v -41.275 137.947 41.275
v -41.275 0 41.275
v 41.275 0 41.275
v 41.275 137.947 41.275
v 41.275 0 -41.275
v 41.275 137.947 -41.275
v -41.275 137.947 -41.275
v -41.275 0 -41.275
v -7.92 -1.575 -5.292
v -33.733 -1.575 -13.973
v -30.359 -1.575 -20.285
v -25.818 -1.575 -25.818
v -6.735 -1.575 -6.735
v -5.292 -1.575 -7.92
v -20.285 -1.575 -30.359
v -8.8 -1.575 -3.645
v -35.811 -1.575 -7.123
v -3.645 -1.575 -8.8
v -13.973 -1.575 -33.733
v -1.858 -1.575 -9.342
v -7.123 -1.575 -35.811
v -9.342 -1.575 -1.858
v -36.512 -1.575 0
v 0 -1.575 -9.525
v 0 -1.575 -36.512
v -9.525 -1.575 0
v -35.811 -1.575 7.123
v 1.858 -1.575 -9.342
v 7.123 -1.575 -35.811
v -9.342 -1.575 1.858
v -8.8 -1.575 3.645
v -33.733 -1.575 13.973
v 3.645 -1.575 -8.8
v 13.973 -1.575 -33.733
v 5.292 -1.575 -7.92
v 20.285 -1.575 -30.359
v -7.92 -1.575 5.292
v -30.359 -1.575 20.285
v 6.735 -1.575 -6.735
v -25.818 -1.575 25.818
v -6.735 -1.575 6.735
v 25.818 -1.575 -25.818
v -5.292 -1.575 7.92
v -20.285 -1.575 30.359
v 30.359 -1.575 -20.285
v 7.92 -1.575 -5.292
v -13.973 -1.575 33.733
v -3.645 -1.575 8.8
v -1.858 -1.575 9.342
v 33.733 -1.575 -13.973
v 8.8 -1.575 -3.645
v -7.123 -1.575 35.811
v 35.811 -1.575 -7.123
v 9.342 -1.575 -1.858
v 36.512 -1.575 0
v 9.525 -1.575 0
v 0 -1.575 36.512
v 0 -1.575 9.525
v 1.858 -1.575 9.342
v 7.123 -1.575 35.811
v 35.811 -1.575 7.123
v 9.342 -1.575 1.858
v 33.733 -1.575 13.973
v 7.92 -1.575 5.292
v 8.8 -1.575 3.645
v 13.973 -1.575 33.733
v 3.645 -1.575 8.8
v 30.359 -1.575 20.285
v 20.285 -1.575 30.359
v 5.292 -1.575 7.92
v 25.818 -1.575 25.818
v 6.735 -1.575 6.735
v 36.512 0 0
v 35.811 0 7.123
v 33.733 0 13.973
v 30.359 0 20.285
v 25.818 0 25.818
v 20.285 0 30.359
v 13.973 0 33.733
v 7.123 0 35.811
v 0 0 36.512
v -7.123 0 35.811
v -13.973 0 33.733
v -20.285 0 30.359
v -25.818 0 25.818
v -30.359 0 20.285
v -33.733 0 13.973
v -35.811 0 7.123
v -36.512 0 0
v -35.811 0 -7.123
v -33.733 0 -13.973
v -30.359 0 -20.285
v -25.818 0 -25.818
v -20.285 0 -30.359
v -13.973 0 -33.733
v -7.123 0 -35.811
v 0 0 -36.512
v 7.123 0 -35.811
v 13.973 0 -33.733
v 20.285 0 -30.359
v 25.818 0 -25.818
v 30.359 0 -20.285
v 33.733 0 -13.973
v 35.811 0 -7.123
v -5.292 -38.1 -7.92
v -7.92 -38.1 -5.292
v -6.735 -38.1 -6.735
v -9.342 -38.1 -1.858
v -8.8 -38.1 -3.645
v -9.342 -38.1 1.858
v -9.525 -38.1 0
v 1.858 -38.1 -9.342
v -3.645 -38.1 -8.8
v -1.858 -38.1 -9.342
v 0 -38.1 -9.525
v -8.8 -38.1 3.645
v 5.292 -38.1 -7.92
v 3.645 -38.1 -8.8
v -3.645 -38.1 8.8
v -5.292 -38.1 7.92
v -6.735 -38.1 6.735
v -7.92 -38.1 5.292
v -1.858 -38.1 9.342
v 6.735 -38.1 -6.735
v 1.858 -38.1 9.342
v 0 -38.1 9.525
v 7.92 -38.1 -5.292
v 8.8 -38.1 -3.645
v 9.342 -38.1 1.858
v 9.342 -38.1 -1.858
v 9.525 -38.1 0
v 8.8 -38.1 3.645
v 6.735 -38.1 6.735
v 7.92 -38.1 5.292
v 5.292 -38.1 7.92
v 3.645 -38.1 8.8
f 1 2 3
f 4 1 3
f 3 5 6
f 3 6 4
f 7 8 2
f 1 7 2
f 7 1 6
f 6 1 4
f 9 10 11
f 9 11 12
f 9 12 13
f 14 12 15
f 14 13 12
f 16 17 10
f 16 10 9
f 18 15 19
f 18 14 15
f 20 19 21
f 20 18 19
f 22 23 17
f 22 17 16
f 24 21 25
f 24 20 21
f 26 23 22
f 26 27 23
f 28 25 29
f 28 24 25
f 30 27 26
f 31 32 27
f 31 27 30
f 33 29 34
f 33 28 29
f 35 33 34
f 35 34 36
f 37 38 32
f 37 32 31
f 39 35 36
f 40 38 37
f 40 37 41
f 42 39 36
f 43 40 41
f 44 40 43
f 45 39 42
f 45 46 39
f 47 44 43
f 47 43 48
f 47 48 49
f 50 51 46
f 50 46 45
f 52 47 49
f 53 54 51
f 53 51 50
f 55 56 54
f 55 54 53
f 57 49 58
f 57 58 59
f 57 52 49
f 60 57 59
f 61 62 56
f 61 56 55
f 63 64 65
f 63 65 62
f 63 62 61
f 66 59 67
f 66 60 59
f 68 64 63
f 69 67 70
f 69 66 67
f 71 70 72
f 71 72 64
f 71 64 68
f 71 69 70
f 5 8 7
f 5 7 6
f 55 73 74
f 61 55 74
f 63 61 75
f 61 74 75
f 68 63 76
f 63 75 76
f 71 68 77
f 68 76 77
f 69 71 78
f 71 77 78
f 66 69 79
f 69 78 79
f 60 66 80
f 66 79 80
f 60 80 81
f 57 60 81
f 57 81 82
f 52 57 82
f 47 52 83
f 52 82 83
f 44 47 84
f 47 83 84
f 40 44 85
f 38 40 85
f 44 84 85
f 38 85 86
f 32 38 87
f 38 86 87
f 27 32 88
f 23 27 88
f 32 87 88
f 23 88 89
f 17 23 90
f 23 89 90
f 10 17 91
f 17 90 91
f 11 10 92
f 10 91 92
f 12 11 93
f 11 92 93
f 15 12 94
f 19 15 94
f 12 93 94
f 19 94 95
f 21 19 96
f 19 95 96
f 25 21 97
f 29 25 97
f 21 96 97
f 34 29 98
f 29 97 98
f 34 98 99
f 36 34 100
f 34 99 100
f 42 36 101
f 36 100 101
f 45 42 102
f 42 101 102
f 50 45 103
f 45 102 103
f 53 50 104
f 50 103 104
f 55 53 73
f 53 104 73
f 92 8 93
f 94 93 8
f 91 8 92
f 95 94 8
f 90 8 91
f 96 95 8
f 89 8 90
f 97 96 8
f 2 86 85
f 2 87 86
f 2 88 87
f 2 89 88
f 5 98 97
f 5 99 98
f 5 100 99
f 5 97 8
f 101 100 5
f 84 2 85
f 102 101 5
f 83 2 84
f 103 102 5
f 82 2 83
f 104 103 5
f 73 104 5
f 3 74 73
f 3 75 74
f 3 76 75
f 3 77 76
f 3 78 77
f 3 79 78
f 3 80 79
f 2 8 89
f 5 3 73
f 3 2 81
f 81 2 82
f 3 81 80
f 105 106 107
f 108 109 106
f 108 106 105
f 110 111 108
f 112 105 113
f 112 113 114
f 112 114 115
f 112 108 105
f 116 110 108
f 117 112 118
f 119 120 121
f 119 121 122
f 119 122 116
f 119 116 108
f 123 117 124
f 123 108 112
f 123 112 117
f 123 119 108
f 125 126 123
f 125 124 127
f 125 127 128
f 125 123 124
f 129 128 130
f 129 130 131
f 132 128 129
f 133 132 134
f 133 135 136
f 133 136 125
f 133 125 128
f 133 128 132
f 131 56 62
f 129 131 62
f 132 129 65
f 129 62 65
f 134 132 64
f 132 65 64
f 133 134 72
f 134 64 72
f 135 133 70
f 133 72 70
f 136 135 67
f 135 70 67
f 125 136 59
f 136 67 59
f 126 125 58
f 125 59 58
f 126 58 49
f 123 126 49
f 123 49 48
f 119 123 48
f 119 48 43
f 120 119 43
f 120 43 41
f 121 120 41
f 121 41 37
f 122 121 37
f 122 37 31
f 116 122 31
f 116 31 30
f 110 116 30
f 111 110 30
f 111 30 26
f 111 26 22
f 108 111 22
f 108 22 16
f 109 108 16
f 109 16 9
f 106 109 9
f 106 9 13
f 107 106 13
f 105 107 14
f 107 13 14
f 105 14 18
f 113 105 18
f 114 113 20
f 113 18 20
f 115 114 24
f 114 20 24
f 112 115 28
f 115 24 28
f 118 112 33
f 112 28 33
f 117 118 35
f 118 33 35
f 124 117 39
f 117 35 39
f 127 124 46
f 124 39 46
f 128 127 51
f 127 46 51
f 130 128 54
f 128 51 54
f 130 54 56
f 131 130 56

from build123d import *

# Parameters (mm, degrees)
F0_W     = 82.55
F0_H     = 82.55
F1_DEPTH = 137.9474
F2_R     = 36.5125
F3_DEPTH = 1.5748
F4_R     = 9.525
F5_DEPTH = 38.1


with BuildPart() as f1:
    # F0 (on Front) → F1 (new body)
    with BuildSketch(Plane.XZ):
        Rectangle(F0_W, F0_H)
    extrude(amount=-F1_DEPTH)

    # F2 (on Front) → F3 (join)
    with BuildSketch(Plane.XZ):
        Circle(F2_R)
    extrude(amount=F3_DEPTH)

    # F4 (on Front) → F5 (join)
    with BuildSketch(Plane.XZ):
        Circle(F4_R)
    extrude(amount=F5_DEPTH)


solid = f1.part
